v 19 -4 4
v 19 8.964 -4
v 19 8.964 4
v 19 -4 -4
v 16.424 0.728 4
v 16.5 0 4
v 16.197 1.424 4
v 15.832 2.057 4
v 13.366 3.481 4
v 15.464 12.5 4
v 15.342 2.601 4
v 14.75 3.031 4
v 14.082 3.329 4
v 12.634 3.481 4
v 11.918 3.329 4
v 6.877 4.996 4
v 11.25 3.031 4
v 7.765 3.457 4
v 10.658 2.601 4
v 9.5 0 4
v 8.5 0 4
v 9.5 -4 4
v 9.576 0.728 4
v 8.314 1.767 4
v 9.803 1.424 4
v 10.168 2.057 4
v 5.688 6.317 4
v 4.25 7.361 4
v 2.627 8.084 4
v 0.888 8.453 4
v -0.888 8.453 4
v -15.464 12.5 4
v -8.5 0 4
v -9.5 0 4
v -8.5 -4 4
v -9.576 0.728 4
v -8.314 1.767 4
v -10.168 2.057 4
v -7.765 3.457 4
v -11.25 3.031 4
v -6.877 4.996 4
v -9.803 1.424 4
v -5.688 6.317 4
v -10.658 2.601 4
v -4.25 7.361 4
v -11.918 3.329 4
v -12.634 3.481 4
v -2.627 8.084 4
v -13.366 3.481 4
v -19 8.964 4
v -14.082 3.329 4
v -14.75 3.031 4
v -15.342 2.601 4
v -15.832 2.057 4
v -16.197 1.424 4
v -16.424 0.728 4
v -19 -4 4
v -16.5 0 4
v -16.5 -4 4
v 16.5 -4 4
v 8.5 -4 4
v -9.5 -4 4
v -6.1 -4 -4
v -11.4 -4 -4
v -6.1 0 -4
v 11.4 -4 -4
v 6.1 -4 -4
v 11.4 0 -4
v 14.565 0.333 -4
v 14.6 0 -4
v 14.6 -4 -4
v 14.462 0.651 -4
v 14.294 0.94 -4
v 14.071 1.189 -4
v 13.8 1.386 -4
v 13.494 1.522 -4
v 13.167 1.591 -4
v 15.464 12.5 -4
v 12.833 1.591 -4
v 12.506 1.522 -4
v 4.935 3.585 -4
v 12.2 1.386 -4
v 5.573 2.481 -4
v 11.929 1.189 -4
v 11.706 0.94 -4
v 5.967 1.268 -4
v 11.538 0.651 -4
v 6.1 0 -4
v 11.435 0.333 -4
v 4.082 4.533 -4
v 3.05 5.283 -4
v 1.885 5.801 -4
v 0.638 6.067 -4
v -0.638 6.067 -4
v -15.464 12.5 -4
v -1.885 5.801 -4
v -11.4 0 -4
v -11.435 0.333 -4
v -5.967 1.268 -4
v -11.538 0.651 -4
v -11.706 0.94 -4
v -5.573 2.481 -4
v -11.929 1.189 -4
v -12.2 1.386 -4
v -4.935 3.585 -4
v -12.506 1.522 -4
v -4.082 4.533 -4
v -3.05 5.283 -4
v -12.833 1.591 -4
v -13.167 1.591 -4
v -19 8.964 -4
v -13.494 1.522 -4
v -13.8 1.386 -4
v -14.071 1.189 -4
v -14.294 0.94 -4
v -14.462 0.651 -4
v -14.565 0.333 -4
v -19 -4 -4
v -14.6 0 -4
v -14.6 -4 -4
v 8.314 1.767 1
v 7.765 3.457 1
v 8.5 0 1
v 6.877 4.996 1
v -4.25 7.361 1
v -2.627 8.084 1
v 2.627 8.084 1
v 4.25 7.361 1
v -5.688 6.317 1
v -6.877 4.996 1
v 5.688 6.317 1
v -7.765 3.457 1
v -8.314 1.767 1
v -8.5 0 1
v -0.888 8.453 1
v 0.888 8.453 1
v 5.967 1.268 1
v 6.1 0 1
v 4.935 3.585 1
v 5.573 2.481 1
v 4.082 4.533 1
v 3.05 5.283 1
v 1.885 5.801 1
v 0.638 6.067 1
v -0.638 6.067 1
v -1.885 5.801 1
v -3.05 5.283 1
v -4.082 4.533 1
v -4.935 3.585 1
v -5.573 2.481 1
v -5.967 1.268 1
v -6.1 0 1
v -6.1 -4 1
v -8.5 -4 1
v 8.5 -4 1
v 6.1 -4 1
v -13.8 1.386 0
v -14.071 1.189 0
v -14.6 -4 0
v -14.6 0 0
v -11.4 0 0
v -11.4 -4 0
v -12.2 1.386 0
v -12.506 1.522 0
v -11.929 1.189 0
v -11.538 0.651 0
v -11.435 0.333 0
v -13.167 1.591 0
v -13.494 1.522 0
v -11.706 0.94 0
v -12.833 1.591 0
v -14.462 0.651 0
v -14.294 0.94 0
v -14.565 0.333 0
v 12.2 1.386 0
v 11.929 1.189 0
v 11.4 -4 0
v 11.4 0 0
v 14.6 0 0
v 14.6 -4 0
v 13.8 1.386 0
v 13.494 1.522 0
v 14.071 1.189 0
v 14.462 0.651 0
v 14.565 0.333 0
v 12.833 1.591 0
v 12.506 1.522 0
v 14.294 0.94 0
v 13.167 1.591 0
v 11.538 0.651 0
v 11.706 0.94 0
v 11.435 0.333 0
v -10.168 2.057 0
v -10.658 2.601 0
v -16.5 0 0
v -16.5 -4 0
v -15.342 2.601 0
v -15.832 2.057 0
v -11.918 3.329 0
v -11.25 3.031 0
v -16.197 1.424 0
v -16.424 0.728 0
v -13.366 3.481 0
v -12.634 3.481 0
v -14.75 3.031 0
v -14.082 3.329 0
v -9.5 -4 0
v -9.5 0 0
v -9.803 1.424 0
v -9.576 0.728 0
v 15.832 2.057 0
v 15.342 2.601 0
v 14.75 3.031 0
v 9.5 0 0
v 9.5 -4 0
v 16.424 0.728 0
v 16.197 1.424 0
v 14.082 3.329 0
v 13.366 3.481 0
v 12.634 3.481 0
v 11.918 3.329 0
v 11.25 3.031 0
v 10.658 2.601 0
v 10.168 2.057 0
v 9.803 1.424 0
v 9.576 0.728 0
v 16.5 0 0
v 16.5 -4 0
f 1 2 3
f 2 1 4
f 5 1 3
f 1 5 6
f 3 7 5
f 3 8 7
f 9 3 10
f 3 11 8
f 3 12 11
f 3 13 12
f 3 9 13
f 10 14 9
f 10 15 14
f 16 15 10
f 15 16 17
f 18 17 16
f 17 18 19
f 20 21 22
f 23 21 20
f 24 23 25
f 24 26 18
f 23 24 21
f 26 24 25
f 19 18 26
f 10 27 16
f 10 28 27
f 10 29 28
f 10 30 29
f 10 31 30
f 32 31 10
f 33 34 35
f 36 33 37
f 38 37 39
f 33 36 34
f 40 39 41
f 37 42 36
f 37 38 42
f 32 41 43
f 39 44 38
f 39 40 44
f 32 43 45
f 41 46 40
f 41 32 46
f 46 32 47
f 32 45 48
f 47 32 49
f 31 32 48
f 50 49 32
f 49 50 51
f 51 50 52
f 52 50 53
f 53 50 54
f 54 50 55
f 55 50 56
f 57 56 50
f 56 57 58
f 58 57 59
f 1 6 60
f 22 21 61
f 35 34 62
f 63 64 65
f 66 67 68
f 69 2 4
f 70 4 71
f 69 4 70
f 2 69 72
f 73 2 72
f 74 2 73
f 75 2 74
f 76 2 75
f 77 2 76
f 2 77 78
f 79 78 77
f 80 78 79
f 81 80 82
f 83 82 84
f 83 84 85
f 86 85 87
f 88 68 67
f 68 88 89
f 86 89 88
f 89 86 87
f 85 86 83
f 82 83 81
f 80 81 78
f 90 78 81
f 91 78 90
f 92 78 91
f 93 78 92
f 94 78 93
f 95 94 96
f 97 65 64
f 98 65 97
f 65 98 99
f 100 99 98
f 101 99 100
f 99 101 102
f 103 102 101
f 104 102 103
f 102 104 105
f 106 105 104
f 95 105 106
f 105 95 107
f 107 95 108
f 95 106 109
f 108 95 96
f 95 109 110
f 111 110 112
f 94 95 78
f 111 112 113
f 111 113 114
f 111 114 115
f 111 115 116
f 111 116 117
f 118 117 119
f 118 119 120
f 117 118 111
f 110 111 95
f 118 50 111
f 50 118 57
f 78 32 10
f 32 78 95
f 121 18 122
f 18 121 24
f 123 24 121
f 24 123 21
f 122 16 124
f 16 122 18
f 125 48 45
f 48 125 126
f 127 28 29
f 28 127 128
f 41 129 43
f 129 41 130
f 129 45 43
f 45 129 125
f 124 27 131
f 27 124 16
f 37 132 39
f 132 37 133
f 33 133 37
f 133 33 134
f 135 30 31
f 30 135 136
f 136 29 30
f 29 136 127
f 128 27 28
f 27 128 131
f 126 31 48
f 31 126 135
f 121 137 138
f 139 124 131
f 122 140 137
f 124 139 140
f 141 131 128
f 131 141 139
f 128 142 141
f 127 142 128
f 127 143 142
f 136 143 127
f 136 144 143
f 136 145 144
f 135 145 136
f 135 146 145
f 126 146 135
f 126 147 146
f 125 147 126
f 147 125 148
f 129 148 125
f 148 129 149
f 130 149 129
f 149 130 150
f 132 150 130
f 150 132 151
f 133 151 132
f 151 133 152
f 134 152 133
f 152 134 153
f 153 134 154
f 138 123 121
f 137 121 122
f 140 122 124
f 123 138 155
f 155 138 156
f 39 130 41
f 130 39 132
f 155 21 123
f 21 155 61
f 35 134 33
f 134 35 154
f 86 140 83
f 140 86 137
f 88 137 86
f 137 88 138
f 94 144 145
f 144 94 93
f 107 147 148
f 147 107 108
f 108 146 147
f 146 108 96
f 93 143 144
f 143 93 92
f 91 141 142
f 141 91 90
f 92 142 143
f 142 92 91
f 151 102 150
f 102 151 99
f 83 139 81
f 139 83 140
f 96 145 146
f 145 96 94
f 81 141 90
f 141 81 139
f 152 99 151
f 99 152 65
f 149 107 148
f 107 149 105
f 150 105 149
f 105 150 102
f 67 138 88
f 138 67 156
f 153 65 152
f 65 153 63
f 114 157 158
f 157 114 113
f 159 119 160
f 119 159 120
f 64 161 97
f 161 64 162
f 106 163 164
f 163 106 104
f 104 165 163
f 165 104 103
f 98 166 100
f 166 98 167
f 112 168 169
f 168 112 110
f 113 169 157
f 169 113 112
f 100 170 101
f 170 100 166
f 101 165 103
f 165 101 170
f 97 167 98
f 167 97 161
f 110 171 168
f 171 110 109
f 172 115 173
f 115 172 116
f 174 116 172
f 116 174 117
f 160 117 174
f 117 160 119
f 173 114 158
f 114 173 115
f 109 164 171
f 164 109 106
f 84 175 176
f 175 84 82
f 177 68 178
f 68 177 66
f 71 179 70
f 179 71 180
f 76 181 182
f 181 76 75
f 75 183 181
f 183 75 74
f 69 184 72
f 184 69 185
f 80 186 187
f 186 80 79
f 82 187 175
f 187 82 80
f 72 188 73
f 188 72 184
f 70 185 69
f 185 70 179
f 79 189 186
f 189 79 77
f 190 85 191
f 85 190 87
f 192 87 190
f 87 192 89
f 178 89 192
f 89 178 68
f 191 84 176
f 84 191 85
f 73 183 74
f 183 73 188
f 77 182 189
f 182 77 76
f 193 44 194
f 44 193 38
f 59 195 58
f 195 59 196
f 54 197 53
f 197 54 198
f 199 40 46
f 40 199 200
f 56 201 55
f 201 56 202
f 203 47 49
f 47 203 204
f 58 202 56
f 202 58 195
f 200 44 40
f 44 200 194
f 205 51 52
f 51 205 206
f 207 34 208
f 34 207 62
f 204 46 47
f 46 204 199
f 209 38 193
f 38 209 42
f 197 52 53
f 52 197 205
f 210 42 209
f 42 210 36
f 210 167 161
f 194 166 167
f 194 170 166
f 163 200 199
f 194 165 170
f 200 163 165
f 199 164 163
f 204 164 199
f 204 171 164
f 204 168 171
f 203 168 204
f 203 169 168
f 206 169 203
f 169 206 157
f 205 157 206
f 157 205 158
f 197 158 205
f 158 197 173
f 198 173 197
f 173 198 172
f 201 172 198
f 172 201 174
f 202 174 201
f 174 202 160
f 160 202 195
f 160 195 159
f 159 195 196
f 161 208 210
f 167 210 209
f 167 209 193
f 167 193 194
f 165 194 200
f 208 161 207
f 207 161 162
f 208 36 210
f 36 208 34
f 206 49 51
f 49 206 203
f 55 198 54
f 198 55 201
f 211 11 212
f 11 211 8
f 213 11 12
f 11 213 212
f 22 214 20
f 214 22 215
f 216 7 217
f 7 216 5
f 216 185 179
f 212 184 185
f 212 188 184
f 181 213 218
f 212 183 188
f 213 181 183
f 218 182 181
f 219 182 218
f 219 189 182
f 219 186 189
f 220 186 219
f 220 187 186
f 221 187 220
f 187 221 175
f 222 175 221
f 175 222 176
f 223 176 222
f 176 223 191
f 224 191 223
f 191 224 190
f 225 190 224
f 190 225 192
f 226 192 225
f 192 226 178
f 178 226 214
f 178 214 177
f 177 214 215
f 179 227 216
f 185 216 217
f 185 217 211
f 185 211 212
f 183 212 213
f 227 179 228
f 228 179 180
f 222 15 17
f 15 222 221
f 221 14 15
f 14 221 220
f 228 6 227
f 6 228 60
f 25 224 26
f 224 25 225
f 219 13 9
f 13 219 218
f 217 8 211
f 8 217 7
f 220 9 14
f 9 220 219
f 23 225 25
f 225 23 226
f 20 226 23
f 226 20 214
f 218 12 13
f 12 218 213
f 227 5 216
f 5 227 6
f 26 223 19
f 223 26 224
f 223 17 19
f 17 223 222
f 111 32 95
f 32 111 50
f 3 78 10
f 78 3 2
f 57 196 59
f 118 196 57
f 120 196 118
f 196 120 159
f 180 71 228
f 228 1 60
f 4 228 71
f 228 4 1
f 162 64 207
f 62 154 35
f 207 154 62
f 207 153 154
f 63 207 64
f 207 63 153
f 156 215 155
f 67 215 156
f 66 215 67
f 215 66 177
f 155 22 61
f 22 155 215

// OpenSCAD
// RebeliX
//
// nozzle mount
// GNU GPL v3
// Martin Neruda
// http://www.reprap4u.cz

mount_height =8;
mount_width = 25;
mount_length = 38;
mount_jhead=5;

epsilon = 0.01;

difference(){
	union(){
	  cube([mount_length,mount_width,mount_height],center=true);
	}		
		
	translate([0,0,mount_jhead]) cylinder(r=8.5,h=mount_height,$fn=30,center=true);
	translate([0,-mount_width/2,mount_jhead]) cube([17,mount_width,mount_height],center=true);
	
	translate([0,0,-mount_height/2 - epsilon]) cylinder(r=6.1,h=mount_height,$fn=30);
	translate([0,-mount_width/2,-epsilon]) cube([12.2,mount_width,mount_height],center=true);
	
	// Otvory pro prisroubovani
	translate([-13,0,0])
        hull(){ 
            cylinder(r=1.6,h=mount_height+1,$fn=30,center=true);
            translate([0,-mount_width/2])cylinder(r=1.6,h=mount_height+1,$fn=30,center=true);
        }
    translate([13,0,0])
        hull(){ 
            cylinder(r=1.6,h=mount_height+1,$fn=30,center=true);
            translate([0,-mount_width/2])cylinder(r=1.6,h=mount_height+1,$fn=30,center=true);
        }
	
	
	
	
	
	translate([-13,0,-mount_height/2 + 4]) 
       hull(){
              cylinder(r=7/2,h=mount_height,$fn=30);
              translate([0,-mount_width/2])cylinder(r=7/2,h=mount_height,$fn=30);
       }
	translate([13,0,-mount_height/2 + 4]) 
       hull(){
              cylinder(r=7/2,h=mount_height,$fn=30);
              translate([0,-mount_width/2])cylinder(r=7/2,h=mount_height,$fn=30);
       }
	
	
	// Seriznute rohy
	translate([-mount_length/2,mount_width/2,0]) rotate([0,0,135]) cube([5,5,mount_height + 1],center=true);
	//translate([-mount_length/2,-mount_width/2,0]) rotate([0,0,-45]) cube([5,5,mount_height + 1],center=true);
	//translate([mount_length/2,-mount_width/2,0]) rotate([0,0,45]) cube([5,5,mount_height + 1],center=true);
	translate([mount_length/2,mount_width/2,0]) rotate([0,0,135]) cube([5,5,mount_height + 1],center=true);
    //final cut
       
    translate([0,-mount_width+8.5])cube([mount_length,mount_width,mount_height],center=true);
}	
